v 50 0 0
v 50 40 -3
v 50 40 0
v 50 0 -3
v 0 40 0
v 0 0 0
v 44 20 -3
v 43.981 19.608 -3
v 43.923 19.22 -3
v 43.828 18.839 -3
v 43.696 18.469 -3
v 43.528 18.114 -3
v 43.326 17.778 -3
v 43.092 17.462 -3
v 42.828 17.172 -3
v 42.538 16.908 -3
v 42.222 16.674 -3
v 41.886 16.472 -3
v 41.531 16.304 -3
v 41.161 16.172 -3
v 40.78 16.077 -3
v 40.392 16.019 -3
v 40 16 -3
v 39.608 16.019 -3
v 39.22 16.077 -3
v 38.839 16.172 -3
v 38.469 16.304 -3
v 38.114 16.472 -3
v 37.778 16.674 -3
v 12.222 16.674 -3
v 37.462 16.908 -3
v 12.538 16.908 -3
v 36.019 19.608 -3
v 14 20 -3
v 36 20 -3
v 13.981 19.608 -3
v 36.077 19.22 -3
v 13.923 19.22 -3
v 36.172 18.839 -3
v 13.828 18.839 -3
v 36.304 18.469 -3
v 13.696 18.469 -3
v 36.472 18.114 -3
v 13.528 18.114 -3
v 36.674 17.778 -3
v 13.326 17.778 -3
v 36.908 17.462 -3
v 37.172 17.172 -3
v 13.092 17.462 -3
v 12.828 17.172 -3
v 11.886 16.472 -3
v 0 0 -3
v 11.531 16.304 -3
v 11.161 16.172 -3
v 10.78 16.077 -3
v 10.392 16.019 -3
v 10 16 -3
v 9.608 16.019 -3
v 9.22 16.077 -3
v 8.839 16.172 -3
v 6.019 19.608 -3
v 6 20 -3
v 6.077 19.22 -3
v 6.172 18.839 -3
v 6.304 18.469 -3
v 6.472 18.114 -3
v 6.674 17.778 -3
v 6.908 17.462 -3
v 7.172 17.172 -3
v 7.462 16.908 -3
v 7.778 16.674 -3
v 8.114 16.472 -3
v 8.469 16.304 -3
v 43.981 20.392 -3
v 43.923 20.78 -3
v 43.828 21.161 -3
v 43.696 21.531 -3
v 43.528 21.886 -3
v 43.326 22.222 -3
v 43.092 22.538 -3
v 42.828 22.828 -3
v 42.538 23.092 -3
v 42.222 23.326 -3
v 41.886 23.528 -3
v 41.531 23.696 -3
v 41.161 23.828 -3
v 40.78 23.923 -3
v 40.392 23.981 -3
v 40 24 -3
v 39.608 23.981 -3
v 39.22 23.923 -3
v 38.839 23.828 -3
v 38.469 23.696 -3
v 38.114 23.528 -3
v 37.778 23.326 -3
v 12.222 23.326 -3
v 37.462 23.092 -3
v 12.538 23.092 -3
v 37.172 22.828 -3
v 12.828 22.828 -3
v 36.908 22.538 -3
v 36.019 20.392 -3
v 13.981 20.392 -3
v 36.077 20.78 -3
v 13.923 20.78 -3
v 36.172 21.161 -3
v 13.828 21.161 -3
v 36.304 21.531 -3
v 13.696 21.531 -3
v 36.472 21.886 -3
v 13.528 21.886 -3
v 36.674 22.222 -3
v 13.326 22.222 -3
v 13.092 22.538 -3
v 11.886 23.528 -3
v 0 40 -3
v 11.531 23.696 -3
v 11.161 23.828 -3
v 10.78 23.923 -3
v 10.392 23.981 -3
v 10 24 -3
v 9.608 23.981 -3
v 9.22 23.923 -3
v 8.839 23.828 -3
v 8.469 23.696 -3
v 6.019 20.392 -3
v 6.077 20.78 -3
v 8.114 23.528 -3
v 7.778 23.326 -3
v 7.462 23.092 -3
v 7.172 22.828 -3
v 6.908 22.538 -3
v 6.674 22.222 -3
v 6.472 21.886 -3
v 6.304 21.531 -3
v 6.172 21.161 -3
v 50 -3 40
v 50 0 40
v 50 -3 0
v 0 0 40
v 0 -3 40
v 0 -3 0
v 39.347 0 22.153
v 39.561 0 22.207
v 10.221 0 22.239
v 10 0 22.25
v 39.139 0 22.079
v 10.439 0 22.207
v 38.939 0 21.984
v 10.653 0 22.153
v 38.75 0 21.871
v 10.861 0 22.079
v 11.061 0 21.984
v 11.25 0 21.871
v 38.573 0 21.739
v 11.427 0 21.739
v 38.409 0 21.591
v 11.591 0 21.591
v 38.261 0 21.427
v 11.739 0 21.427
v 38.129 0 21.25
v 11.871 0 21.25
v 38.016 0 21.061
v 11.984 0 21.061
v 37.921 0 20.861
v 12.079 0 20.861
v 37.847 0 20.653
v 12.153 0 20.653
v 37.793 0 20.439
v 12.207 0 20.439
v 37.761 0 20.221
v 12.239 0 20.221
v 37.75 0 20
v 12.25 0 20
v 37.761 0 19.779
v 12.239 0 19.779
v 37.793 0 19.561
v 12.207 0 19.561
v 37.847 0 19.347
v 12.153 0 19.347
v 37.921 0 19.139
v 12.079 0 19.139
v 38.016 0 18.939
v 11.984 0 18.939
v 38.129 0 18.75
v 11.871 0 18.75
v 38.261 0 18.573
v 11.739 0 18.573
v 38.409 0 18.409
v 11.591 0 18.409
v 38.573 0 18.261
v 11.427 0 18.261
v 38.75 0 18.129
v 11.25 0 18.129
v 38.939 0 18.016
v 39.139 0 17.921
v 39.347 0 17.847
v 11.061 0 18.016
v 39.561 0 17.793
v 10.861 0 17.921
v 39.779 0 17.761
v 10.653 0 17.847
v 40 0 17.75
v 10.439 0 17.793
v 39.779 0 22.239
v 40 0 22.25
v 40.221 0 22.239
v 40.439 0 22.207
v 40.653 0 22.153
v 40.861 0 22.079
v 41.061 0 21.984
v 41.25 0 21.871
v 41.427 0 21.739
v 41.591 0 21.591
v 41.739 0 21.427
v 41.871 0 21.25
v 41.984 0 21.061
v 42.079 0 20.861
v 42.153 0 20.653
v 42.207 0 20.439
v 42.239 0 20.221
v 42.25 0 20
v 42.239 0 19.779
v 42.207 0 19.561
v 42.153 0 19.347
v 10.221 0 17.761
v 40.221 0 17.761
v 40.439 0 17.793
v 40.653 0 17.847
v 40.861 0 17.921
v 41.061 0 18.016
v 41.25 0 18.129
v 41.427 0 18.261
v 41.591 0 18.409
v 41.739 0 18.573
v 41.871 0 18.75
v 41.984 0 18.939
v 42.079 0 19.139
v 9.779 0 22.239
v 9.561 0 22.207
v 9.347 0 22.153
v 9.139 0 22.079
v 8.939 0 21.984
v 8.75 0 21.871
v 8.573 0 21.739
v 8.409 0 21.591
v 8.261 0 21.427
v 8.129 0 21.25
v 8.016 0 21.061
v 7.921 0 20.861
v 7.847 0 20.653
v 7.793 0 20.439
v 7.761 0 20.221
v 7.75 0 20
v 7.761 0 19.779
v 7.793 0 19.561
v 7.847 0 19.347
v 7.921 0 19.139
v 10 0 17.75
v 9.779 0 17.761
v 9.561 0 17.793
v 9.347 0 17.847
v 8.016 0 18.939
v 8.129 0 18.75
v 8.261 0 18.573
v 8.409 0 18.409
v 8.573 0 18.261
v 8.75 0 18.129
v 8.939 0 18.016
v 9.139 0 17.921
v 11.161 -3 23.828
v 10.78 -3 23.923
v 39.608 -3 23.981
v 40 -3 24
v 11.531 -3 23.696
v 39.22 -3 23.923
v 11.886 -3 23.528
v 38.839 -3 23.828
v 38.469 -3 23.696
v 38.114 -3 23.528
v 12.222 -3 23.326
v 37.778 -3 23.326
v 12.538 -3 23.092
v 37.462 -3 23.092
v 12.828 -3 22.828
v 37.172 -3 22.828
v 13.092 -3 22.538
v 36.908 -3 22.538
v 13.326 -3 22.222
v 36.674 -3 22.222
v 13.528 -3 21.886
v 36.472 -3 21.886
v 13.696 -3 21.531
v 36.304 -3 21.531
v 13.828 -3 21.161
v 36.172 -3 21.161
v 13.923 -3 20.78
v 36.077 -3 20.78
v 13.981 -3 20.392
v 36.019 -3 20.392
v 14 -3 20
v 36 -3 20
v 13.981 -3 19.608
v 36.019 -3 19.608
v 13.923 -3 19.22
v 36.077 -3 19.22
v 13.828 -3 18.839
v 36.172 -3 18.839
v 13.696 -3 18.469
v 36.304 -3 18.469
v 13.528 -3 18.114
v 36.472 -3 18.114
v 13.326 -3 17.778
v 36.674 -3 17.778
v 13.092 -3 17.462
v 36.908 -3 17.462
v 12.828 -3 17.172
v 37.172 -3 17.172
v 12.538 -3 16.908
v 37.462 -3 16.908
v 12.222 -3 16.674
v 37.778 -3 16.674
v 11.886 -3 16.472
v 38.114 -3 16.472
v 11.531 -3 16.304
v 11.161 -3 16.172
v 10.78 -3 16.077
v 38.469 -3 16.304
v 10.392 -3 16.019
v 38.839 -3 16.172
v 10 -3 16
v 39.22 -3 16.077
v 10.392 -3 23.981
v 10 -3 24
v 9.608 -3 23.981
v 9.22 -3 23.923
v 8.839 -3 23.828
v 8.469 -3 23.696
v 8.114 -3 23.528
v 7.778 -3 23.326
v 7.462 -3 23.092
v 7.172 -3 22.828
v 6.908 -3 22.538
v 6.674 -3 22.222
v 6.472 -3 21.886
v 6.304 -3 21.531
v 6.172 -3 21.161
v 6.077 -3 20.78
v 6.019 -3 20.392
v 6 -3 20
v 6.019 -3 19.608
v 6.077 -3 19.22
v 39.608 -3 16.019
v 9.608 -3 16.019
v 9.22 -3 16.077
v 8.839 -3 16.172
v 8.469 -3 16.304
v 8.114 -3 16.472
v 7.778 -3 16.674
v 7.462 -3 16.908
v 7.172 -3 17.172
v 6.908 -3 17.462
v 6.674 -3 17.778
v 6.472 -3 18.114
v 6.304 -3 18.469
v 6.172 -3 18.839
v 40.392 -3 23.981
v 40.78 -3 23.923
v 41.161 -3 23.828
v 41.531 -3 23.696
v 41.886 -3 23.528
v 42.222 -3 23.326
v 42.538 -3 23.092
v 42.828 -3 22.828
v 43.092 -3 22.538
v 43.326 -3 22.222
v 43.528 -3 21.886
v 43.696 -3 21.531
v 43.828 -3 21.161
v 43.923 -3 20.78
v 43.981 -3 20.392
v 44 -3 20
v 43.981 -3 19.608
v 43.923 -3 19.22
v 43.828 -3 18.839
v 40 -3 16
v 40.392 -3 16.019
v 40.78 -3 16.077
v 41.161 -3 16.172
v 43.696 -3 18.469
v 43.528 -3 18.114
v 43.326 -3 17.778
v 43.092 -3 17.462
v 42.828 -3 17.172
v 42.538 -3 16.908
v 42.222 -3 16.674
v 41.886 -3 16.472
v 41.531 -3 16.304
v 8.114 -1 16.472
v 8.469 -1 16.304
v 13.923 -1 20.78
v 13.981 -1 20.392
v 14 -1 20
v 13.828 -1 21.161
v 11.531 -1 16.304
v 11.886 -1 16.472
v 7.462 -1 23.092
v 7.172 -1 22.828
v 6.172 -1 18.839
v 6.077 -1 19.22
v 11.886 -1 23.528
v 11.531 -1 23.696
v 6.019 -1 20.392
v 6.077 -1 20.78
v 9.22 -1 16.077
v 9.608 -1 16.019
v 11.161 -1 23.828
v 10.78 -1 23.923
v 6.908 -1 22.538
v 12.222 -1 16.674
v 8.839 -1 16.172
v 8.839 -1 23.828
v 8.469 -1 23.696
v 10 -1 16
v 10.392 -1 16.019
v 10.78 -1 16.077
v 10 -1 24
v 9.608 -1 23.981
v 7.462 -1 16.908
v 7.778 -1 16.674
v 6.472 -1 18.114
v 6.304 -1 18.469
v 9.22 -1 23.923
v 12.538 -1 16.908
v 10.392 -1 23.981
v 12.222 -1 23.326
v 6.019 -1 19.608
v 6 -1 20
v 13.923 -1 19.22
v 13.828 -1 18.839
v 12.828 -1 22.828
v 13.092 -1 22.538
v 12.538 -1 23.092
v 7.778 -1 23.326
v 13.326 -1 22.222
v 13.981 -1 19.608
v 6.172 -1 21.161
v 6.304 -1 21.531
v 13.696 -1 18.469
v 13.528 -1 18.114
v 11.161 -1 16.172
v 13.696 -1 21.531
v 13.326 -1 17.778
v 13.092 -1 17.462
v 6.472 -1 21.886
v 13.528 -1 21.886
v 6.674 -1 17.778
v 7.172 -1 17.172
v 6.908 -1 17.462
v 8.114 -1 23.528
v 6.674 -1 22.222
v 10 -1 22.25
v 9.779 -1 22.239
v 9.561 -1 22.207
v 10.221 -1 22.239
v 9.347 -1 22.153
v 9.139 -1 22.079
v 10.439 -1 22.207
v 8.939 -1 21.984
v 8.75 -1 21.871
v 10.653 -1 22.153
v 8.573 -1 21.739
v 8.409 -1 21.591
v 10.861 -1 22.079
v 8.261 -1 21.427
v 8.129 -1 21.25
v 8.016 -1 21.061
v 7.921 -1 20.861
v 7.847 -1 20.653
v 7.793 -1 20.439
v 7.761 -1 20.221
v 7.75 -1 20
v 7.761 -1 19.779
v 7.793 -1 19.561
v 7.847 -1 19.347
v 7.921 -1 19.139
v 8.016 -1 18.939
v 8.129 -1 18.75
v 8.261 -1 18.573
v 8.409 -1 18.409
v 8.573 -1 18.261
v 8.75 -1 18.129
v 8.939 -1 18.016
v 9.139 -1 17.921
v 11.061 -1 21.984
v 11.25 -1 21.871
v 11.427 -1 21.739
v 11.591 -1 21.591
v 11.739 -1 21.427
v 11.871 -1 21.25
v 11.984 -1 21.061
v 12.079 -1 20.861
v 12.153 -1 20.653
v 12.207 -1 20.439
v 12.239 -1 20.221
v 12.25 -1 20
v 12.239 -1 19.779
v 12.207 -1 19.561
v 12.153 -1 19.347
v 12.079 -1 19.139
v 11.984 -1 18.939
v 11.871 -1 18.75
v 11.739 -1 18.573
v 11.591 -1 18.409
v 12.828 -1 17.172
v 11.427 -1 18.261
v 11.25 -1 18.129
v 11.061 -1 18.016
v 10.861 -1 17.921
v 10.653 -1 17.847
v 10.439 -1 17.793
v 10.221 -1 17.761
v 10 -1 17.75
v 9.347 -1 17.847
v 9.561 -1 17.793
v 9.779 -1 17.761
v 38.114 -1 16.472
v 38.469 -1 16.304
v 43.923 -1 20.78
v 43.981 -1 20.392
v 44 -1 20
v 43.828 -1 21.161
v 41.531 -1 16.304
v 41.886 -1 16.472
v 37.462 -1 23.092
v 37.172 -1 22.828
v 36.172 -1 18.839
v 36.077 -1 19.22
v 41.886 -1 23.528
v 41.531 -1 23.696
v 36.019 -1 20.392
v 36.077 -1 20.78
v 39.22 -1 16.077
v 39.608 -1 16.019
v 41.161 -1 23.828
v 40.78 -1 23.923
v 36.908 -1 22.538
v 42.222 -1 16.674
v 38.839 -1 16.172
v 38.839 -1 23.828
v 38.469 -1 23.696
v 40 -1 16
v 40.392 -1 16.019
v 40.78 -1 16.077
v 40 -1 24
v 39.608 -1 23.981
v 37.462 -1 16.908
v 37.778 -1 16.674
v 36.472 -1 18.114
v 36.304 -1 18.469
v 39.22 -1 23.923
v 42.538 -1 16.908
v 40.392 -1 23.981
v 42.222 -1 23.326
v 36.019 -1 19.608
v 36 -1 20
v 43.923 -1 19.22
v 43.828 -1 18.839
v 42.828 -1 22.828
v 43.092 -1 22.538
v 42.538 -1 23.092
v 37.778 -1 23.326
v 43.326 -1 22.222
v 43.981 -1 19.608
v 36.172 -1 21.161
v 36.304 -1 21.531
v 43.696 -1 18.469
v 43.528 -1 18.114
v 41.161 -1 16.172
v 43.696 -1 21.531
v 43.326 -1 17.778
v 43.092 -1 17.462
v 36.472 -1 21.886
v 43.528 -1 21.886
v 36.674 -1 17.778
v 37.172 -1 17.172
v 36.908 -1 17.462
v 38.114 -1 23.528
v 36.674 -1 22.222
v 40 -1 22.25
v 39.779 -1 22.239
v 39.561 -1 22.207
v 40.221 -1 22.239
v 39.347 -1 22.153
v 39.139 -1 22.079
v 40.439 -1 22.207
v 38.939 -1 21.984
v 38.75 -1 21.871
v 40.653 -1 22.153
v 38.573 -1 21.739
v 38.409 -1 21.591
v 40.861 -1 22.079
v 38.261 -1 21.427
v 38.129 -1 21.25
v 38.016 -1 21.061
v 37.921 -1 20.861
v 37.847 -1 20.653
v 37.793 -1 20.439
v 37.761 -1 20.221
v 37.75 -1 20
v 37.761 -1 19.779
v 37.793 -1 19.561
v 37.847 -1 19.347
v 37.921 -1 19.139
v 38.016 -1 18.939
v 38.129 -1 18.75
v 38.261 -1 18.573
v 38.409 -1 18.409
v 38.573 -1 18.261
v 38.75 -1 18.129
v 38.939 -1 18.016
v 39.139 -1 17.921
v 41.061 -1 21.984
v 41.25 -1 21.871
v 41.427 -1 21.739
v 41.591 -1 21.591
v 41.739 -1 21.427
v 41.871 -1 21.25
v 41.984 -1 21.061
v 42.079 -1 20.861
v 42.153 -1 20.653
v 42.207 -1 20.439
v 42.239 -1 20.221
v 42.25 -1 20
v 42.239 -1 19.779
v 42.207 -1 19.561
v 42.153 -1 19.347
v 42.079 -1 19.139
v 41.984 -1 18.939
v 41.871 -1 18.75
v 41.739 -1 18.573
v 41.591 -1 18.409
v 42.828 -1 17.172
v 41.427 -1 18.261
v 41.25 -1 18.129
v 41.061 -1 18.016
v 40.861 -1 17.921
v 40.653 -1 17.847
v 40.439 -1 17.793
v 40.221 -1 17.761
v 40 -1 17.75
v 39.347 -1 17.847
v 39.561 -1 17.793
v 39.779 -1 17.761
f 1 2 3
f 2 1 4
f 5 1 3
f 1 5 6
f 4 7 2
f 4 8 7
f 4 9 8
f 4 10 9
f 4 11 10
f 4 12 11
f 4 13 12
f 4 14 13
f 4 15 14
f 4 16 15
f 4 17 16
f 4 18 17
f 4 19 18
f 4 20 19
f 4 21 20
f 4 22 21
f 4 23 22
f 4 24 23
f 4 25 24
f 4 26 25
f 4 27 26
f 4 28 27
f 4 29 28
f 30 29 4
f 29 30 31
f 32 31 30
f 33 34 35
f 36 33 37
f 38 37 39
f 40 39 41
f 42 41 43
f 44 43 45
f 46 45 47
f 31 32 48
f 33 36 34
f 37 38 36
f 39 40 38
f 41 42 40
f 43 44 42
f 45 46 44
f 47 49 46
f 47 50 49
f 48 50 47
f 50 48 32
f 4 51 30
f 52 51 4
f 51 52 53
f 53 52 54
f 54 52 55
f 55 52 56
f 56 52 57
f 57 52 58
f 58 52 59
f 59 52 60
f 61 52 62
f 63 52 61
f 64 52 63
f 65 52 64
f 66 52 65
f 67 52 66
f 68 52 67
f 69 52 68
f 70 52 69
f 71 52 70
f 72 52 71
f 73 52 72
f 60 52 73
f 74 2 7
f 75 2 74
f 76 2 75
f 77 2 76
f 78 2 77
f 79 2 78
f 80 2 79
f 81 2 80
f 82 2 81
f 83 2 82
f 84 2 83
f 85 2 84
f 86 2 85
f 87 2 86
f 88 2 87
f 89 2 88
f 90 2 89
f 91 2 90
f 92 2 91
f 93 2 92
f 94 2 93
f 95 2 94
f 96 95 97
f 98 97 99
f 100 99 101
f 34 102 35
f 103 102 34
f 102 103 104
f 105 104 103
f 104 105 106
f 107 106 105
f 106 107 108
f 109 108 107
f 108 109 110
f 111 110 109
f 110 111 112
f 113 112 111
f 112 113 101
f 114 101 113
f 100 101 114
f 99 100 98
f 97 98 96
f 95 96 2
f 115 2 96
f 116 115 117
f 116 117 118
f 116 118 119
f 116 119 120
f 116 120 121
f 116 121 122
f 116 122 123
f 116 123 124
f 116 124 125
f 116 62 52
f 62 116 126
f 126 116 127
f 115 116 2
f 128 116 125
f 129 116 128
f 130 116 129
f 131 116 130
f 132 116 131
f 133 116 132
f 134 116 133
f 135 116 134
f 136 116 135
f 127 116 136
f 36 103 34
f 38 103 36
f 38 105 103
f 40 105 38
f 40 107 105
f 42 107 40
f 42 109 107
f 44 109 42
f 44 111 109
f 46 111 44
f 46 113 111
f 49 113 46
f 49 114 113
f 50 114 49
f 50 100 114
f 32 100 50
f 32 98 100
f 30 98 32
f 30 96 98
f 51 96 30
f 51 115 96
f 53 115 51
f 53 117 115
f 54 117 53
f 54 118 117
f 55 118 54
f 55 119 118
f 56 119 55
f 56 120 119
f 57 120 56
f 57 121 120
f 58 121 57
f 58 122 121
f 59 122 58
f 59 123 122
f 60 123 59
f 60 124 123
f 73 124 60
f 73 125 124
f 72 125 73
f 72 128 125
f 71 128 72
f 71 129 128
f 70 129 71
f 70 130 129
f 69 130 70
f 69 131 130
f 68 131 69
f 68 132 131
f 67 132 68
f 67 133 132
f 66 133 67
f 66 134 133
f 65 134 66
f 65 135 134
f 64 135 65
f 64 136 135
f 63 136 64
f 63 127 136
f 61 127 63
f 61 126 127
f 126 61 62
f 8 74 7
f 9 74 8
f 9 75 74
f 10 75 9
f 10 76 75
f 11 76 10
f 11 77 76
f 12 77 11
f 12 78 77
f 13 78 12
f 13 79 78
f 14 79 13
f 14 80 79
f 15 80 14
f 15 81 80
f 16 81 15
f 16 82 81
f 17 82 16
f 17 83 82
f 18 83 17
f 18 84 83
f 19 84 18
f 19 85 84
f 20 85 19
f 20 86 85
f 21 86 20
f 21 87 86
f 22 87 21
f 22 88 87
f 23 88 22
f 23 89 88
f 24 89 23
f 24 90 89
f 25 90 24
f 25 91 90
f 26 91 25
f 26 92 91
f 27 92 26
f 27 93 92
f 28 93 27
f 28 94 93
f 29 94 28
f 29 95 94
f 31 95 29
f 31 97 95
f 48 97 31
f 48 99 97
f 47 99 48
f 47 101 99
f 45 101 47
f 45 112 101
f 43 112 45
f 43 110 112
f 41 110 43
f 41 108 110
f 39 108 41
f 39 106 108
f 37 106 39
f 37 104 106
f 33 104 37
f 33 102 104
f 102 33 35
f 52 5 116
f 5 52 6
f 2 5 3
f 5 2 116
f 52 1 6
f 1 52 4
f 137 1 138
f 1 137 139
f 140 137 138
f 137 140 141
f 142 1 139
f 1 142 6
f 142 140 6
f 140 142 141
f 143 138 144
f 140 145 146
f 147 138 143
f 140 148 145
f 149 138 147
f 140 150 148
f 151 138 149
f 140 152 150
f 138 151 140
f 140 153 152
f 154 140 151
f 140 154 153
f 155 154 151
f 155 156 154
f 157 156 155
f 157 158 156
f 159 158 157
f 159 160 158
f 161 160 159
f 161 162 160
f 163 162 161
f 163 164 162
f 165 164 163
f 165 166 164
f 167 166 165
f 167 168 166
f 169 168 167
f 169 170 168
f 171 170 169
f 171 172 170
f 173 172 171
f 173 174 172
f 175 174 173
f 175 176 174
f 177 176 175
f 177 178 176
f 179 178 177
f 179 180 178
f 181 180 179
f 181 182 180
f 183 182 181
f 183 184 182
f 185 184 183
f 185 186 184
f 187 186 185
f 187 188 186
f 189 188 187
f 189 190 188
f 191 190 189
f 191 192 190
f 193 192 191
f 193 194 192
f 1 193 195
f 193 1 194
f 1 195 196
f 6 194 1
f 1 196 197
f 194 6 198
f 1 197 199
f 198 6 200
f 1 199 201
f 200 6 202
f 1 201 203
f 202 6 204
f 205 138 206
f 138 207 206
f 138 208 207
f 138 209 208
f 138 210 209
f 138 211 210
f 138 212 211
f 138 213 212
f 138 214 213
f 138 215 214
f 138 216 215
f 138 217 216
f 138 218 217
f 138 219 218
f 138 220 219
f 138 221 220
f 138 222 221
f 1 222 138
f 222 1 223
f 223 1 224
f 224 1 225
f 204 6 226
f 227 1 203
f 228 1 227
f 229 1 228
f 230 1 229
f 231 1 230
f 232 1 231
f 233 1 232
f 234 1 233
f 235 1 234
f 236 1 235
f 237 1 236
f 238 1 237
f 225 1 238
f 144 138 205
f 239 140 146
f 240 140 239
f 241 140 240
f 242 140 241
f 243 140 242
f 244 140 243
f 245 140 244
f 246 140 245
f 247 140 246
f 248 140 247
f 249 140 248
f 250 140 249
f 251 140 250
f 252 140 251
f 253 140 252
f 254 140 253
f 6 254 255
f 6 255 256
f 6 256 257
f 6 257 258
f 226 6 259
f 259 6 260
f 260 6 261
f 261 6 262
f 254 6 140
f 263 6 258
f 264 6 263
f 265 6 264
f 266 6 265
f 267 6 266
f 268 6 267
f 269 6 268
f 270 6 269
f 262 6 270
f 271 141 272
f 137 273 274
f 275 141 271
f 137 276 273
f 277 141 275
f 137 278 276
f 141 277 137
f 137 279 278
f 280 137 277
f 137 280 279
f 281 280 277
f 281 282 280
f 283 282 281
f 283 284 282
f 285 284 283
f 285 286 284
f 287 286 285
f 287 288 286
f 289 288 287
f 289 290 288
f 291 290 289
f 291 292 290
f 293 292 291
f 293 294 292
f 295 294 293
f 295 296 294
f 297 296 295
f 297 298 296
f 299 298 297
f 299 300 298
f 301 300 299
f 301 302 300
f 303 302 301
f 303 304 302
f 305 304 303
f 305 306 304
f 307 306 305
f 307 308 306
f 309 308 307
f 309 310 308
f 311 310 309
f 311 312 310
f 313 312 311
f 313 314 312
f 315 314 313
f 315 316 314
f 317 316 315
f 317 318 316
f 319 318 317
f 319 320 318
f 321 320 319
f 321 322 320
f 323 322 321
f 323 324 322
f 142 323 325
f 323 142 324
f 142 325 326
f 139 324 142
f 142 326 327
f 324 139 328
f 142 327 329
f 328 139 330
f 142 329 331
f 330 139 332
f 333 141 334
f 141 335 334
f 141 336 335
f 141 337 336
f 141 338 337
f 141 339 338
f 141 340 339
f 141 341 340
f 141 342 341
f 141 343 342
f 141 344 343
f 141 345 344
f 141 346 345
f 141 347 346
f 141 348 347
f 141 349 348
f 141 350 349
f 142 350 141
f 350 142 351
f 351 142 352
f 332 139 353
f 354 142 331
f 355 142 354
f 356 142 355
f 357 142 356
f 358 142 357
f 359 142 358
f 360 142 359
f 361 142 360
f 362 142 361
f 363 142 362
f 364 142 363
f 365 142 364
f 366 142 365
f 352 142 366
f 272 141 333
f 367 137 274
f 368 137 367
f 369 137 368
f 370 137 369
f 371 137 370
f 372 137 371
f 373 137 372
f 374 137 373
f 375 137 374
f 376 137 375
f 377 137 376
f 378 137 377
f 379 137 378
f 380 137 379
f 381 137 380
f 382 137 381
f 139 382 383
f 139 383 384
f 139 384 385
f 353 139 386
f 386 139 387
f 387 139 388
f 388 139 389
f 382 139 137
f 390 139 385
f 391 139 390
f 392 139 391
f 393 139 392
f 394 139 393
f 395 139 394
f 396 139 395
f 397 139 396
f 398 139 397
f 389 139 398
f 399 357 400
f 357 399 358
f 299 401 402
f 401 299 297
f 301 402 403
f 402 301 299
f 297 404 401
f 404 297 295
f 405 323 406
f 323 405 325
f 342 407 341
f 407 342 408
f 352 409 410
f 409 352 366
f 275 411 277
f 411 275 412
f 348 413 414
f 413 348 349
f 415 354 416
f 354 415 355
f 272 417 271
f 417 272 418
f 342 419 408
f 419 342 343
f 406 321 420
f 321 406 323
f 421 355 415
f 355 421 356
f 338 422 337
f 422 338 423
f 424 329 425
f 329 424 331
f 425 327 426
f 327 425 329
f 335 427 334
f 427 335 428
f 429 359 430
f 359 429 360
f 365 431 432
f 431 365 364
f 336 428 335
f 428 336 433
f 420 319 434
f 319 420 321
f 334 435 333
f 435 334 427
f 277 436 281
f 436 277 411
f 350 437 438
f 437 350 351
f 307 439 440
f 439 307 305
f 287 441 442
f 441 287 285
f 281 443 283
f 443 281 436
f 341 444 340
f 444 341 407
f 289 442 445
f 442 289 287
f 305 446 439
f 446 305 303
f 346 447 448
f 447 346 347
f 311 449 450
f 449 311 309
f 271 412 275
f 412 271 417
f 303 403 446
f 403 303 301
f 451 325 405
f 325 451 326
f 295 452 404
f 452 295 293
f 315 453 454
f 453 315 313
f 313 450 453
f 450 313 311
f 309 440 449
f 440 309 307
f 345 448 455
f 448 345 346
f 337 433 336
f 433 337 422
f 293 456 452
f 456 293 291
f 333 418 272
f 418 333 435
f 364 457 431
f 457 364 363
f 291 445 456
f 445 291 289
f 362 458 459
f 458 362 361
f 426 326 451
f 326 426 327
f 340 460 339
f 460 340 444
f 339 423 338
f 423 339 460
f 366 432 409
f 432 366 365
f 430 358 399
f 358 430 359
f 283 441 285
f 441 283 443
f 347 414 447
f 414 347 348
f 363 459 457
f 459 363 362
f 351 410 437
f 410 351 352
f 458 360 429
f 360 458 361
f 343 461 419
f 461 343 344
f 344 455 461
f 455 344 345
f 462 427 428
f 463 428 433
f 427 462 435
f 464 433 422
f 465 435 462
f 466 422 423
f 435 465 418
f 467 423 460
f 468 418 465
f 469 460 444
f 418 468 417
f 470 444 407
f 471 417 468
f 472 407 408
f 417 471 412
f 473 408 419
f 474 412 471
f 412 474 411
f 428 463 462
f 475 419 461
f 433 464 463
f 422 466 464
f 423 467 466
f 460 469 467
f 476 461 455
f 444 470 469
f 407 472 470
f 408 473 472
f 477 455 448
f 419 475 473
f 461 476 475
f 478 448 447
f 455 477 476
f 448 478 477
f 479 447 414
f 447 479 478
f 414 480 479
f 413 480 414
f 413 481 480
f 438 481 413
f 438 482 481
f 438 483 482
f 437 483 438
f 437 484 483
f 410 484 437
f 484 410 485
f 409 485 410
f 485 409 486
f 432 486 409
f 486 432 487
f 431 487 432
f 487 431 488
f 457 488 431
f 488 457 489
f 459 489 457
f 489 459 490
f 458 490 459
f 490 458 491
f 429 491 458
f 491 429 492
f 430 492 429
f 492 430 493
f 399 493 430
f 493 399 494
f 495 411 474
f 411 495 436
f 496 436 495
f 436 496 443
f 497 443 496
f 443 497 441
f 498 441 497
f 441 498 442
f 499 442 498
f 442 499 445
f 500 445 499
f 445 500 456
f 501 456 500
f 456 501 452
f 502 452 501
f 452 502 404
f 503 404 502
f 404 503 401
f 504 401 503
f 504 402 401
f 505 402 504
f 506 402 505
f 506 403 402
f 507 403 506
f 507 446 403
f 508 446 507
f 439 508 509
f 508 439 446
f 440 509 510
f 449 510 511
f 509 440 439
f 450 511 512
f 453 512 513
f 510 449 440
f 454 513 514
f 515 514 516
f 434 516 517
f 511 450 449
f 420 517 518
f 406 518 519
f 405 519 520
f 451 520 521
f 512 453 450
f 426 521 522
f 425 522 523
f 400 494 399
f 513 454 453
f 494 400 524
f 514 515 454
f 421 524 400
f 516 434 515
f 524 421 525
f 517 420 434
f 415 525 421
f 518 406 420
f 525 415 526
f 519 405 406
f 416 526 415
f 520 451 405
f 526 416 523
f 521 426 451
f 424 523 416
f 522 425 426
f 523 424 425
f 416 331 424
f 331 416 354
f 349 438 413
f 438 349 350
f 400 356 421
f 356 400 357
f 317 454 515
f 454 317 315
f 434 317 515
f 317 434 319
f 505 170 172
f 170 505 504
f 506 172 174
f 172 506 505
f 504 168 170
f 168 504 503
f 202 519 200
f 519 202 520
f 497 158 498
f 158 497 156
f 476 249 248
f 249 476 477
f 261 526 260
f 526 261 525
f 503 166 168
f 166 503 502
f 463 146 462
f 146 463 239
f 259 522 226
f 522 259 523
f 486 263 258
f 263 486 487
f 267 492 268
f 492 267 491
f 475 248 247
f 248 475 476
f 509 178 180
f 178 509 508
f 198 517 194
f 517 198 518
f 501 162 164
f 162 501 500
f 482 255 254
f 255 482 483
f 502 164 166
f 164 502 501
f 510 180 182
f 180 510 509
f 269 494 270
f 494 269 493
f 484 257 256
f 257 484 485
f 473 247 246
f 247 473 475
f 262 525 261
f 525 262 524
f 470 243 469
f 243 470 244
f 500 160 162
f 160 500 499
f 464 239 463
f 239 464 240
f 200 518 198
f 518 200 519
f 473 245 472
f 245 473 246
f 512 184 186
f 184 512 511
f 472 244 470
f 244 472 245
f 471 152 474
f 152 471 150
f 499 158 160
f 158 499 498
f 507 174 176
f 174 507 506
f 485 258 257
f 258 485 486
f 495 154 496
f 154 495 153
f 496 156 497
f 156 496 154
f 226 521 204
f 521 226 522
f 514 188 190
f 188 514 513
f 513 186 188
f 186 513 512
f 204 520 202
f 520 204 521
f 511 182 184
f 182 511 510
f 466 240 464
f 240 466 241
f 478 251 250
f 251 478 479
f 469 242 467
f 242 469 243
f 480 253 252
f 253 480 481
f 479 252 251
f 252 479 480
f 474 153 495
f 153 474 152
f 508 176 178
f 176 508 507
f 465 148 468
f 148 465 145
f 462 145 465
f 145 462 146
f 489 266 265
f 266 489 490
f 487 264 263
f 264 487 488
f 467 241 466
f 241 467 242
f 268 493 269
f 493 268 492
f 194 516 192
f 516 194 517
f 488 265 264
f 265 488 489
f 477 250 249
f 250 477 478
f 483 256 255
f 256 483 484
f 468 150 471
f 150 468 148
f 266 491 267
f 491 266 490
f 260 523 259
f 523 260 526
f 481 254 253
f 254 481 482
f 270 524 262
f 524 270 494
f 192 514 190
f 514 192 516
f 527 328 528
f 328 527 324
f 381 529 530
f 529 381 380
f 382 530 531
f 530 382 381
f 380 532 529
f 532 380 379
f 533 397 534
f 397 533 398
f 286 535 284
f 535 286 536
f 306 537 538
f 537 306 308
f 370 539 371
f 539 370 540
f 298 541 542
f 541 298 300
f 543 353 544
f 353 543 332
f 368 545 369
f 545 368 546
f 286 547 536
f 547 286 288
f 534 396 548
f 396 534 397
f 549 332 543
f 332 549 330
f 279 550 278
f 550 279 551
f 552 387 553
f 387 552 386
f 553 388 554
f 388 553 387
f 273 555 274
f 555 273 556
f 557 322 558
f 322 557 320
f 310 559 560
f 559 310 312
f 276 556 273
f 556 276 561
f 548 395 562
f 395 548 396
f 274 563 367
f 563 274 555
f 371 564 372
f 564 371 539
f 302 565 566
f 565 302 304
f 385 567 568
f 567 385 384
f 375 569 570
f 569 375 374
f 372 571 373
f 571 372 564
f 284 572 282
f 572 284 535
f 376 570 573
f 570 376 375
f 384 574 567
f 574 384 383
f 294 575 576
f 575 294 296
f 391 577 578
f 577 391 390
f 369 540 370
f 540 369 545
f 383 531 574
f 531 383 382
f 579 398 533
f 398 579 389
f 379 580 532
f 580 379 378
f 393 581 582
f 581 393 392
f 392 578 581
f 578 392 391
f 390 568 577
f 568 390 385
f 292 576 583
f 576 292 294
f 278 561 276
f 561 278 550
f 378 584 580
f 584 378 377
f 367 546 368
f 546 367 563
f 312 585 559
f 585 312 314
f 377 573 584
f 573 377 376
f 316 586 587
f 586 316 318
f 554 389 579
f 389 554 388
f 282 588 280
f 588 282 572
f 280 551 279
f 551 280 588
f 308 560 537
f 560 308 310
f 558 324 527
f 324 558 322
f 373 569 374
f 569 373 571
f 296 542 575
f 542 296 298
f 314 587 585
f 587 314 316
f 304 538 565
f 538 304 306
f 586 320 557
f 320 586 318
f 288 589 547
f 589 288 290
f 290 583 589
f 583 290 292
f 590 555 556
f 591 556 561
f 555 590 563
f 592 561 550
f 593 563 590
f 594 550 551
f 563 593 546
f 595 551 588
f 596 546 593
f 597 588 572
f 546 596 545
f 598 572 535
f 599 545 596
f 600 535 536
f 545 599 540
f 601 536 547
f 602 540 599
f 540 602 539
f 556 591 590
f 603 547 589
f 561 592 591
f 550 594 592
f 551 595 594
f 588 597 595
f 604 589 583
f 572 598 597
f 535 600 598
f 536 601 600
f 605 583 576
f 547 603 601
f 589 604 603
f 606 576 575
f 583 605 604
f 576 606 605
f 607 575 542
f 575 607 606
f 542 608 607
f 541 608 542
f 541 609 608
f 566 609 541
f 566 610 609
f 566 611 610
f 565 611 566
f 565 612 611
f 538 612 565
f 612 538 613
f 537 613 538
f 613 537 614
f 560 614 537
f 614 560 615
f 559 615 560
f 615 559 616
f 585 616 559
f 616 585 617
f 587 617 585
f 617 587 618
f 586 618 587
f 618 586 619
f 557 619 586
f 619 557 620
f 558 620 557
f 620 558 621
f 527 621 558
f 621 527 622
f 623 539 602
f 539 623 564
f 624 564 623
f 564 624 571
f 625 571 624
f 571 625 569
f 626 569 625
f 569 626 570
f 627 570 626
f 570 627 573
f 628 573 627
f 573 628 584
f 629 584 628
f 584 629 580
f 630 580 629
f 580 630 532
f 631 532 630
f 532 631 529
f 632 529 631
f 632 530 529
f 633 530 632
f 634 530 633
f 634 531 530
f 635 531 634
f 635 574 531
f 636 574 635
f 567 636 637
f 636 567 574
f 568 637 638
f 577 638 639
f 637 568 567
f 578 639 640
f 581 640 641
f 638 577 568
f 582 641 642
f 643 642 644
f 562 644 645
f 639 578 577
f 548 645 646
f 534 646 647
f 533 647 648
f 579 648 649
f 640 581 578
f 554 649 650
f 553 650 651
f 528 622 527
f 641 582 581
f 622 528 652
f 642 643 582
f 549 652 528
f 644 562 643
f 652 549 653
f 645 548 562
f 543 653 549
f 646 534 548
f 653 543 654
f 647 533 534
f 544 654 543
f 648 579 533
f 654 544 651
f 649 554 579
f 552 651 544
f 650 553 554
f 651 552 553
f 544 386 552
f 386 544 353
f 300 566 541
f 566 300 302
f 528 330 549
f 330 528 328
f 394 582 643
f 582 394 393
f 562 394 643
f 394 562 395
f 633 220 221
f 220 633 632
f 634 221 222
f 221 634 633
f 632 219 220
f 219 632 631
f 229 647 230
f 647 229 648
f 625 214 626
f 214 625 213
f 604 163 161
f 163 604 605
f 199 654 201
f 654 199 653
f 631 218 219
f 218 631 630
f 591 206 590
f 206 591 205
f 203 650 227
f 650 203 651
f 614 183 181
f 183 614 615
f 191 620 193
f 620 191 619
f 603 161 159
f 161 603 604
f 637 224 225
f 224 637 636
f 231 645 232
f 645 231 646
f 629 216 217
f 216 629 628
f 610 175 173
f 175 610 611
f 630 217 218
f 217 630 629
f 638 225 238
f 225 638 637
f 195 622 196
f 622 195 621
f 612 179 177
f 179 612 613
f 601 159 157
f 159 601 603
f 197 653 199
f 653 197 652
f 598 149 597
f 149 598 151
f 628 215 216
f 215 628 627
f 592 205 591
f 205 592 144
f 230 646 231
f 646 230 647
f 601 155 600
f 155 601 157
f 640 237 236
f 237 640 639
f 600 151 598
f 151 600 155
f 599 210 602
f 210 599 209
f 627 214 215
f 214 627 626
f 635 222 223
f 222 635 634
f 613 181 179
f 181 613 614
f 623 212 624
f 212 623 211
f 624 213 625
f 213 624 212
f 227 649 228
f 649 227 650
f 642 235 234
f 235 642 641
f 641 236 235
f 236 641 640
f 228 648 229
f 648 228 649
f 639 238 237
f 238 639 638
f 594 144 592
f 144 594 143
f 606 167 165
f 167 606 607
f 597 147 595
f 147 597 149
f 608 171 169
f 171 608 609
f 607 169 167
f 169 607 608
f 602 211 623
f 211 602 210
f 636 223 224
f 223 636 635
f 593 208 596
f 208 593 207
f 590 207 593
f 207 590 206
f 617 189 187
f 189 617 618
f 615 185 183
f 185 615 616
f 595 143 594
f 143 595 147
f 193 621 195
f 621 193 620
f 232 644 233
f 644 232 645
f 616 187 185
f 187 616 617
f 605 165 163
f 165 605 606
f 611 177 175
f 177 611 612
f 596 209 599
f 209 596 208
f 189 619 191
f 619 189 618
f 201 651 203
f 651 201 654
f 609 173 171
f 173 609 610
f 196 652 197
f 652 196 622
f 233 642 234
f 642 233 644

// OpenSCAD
$fn = 64;

// Dimensions
width = 50;
depth = 40;
height = 40;
thickness = 3;

// Hole specs
through_d = 4.5;
csink_d = 8;
csink_depth = 2;

// Hole positions
x1 = 10;
x2 = width - 10;
y_center = depth / 2;
z_center = height / 2;

module countersunk_hole_z_up(h=thickness) {
    union() {
        cylinder(h=csink_depth, d=csink_d);
        translate([0, 0, csink_depth])
            cylinder(h=h - csink_depth, d=through_d);
    }
}

module countersunk_hole_y_pos(h=thickness) {
    rotate([90, 0, 0])
        union() {
            cylinder(h=csink_depth, d=csink_d);
            translate([0, 0, csink_depth])
                cylinder(h=h - csink_depth, d=through_d);
        }
}

difference() {
    union() {
        // Horizontal flange: inner top face at z=0, extends +Y, thickness toward -Z
        translate([0, 0, -thickness])
            cube([width, depth, thickness]);

        // Vertical flange: inner front face at y=0, extends +Z, thickness toward -Y
        translate([0, -thickness, 0])
            cube([width, thickness, height]);
    }

    // Horizontal flange holes: on centerline, 10mm from left/right edges,
    // countersink on outer face (bottom, -Z)
    translate([x1, y_center, -thickness])
        mirror([0, 0, 1])
            countersunk_hole_z_up(thickness);
    translate([x2, y_center, -thickness])
        mirror([0, 0, 1])
            countersunk_hole_z_up(thickness);

    // Vertical flange holes: on centerline, 10mm from left/right edges,
    // countersink on outer face (back, -Y)
    translate([x1, -thickness, z_center])
        mirror([0, 1, 0])
            countersunk_hole_y_pos(thickness);
    translate([x2, -thickness, z_center])
        mirror([0, 1, 0])
            countersunk_hole_y_pos(thickness);
}
